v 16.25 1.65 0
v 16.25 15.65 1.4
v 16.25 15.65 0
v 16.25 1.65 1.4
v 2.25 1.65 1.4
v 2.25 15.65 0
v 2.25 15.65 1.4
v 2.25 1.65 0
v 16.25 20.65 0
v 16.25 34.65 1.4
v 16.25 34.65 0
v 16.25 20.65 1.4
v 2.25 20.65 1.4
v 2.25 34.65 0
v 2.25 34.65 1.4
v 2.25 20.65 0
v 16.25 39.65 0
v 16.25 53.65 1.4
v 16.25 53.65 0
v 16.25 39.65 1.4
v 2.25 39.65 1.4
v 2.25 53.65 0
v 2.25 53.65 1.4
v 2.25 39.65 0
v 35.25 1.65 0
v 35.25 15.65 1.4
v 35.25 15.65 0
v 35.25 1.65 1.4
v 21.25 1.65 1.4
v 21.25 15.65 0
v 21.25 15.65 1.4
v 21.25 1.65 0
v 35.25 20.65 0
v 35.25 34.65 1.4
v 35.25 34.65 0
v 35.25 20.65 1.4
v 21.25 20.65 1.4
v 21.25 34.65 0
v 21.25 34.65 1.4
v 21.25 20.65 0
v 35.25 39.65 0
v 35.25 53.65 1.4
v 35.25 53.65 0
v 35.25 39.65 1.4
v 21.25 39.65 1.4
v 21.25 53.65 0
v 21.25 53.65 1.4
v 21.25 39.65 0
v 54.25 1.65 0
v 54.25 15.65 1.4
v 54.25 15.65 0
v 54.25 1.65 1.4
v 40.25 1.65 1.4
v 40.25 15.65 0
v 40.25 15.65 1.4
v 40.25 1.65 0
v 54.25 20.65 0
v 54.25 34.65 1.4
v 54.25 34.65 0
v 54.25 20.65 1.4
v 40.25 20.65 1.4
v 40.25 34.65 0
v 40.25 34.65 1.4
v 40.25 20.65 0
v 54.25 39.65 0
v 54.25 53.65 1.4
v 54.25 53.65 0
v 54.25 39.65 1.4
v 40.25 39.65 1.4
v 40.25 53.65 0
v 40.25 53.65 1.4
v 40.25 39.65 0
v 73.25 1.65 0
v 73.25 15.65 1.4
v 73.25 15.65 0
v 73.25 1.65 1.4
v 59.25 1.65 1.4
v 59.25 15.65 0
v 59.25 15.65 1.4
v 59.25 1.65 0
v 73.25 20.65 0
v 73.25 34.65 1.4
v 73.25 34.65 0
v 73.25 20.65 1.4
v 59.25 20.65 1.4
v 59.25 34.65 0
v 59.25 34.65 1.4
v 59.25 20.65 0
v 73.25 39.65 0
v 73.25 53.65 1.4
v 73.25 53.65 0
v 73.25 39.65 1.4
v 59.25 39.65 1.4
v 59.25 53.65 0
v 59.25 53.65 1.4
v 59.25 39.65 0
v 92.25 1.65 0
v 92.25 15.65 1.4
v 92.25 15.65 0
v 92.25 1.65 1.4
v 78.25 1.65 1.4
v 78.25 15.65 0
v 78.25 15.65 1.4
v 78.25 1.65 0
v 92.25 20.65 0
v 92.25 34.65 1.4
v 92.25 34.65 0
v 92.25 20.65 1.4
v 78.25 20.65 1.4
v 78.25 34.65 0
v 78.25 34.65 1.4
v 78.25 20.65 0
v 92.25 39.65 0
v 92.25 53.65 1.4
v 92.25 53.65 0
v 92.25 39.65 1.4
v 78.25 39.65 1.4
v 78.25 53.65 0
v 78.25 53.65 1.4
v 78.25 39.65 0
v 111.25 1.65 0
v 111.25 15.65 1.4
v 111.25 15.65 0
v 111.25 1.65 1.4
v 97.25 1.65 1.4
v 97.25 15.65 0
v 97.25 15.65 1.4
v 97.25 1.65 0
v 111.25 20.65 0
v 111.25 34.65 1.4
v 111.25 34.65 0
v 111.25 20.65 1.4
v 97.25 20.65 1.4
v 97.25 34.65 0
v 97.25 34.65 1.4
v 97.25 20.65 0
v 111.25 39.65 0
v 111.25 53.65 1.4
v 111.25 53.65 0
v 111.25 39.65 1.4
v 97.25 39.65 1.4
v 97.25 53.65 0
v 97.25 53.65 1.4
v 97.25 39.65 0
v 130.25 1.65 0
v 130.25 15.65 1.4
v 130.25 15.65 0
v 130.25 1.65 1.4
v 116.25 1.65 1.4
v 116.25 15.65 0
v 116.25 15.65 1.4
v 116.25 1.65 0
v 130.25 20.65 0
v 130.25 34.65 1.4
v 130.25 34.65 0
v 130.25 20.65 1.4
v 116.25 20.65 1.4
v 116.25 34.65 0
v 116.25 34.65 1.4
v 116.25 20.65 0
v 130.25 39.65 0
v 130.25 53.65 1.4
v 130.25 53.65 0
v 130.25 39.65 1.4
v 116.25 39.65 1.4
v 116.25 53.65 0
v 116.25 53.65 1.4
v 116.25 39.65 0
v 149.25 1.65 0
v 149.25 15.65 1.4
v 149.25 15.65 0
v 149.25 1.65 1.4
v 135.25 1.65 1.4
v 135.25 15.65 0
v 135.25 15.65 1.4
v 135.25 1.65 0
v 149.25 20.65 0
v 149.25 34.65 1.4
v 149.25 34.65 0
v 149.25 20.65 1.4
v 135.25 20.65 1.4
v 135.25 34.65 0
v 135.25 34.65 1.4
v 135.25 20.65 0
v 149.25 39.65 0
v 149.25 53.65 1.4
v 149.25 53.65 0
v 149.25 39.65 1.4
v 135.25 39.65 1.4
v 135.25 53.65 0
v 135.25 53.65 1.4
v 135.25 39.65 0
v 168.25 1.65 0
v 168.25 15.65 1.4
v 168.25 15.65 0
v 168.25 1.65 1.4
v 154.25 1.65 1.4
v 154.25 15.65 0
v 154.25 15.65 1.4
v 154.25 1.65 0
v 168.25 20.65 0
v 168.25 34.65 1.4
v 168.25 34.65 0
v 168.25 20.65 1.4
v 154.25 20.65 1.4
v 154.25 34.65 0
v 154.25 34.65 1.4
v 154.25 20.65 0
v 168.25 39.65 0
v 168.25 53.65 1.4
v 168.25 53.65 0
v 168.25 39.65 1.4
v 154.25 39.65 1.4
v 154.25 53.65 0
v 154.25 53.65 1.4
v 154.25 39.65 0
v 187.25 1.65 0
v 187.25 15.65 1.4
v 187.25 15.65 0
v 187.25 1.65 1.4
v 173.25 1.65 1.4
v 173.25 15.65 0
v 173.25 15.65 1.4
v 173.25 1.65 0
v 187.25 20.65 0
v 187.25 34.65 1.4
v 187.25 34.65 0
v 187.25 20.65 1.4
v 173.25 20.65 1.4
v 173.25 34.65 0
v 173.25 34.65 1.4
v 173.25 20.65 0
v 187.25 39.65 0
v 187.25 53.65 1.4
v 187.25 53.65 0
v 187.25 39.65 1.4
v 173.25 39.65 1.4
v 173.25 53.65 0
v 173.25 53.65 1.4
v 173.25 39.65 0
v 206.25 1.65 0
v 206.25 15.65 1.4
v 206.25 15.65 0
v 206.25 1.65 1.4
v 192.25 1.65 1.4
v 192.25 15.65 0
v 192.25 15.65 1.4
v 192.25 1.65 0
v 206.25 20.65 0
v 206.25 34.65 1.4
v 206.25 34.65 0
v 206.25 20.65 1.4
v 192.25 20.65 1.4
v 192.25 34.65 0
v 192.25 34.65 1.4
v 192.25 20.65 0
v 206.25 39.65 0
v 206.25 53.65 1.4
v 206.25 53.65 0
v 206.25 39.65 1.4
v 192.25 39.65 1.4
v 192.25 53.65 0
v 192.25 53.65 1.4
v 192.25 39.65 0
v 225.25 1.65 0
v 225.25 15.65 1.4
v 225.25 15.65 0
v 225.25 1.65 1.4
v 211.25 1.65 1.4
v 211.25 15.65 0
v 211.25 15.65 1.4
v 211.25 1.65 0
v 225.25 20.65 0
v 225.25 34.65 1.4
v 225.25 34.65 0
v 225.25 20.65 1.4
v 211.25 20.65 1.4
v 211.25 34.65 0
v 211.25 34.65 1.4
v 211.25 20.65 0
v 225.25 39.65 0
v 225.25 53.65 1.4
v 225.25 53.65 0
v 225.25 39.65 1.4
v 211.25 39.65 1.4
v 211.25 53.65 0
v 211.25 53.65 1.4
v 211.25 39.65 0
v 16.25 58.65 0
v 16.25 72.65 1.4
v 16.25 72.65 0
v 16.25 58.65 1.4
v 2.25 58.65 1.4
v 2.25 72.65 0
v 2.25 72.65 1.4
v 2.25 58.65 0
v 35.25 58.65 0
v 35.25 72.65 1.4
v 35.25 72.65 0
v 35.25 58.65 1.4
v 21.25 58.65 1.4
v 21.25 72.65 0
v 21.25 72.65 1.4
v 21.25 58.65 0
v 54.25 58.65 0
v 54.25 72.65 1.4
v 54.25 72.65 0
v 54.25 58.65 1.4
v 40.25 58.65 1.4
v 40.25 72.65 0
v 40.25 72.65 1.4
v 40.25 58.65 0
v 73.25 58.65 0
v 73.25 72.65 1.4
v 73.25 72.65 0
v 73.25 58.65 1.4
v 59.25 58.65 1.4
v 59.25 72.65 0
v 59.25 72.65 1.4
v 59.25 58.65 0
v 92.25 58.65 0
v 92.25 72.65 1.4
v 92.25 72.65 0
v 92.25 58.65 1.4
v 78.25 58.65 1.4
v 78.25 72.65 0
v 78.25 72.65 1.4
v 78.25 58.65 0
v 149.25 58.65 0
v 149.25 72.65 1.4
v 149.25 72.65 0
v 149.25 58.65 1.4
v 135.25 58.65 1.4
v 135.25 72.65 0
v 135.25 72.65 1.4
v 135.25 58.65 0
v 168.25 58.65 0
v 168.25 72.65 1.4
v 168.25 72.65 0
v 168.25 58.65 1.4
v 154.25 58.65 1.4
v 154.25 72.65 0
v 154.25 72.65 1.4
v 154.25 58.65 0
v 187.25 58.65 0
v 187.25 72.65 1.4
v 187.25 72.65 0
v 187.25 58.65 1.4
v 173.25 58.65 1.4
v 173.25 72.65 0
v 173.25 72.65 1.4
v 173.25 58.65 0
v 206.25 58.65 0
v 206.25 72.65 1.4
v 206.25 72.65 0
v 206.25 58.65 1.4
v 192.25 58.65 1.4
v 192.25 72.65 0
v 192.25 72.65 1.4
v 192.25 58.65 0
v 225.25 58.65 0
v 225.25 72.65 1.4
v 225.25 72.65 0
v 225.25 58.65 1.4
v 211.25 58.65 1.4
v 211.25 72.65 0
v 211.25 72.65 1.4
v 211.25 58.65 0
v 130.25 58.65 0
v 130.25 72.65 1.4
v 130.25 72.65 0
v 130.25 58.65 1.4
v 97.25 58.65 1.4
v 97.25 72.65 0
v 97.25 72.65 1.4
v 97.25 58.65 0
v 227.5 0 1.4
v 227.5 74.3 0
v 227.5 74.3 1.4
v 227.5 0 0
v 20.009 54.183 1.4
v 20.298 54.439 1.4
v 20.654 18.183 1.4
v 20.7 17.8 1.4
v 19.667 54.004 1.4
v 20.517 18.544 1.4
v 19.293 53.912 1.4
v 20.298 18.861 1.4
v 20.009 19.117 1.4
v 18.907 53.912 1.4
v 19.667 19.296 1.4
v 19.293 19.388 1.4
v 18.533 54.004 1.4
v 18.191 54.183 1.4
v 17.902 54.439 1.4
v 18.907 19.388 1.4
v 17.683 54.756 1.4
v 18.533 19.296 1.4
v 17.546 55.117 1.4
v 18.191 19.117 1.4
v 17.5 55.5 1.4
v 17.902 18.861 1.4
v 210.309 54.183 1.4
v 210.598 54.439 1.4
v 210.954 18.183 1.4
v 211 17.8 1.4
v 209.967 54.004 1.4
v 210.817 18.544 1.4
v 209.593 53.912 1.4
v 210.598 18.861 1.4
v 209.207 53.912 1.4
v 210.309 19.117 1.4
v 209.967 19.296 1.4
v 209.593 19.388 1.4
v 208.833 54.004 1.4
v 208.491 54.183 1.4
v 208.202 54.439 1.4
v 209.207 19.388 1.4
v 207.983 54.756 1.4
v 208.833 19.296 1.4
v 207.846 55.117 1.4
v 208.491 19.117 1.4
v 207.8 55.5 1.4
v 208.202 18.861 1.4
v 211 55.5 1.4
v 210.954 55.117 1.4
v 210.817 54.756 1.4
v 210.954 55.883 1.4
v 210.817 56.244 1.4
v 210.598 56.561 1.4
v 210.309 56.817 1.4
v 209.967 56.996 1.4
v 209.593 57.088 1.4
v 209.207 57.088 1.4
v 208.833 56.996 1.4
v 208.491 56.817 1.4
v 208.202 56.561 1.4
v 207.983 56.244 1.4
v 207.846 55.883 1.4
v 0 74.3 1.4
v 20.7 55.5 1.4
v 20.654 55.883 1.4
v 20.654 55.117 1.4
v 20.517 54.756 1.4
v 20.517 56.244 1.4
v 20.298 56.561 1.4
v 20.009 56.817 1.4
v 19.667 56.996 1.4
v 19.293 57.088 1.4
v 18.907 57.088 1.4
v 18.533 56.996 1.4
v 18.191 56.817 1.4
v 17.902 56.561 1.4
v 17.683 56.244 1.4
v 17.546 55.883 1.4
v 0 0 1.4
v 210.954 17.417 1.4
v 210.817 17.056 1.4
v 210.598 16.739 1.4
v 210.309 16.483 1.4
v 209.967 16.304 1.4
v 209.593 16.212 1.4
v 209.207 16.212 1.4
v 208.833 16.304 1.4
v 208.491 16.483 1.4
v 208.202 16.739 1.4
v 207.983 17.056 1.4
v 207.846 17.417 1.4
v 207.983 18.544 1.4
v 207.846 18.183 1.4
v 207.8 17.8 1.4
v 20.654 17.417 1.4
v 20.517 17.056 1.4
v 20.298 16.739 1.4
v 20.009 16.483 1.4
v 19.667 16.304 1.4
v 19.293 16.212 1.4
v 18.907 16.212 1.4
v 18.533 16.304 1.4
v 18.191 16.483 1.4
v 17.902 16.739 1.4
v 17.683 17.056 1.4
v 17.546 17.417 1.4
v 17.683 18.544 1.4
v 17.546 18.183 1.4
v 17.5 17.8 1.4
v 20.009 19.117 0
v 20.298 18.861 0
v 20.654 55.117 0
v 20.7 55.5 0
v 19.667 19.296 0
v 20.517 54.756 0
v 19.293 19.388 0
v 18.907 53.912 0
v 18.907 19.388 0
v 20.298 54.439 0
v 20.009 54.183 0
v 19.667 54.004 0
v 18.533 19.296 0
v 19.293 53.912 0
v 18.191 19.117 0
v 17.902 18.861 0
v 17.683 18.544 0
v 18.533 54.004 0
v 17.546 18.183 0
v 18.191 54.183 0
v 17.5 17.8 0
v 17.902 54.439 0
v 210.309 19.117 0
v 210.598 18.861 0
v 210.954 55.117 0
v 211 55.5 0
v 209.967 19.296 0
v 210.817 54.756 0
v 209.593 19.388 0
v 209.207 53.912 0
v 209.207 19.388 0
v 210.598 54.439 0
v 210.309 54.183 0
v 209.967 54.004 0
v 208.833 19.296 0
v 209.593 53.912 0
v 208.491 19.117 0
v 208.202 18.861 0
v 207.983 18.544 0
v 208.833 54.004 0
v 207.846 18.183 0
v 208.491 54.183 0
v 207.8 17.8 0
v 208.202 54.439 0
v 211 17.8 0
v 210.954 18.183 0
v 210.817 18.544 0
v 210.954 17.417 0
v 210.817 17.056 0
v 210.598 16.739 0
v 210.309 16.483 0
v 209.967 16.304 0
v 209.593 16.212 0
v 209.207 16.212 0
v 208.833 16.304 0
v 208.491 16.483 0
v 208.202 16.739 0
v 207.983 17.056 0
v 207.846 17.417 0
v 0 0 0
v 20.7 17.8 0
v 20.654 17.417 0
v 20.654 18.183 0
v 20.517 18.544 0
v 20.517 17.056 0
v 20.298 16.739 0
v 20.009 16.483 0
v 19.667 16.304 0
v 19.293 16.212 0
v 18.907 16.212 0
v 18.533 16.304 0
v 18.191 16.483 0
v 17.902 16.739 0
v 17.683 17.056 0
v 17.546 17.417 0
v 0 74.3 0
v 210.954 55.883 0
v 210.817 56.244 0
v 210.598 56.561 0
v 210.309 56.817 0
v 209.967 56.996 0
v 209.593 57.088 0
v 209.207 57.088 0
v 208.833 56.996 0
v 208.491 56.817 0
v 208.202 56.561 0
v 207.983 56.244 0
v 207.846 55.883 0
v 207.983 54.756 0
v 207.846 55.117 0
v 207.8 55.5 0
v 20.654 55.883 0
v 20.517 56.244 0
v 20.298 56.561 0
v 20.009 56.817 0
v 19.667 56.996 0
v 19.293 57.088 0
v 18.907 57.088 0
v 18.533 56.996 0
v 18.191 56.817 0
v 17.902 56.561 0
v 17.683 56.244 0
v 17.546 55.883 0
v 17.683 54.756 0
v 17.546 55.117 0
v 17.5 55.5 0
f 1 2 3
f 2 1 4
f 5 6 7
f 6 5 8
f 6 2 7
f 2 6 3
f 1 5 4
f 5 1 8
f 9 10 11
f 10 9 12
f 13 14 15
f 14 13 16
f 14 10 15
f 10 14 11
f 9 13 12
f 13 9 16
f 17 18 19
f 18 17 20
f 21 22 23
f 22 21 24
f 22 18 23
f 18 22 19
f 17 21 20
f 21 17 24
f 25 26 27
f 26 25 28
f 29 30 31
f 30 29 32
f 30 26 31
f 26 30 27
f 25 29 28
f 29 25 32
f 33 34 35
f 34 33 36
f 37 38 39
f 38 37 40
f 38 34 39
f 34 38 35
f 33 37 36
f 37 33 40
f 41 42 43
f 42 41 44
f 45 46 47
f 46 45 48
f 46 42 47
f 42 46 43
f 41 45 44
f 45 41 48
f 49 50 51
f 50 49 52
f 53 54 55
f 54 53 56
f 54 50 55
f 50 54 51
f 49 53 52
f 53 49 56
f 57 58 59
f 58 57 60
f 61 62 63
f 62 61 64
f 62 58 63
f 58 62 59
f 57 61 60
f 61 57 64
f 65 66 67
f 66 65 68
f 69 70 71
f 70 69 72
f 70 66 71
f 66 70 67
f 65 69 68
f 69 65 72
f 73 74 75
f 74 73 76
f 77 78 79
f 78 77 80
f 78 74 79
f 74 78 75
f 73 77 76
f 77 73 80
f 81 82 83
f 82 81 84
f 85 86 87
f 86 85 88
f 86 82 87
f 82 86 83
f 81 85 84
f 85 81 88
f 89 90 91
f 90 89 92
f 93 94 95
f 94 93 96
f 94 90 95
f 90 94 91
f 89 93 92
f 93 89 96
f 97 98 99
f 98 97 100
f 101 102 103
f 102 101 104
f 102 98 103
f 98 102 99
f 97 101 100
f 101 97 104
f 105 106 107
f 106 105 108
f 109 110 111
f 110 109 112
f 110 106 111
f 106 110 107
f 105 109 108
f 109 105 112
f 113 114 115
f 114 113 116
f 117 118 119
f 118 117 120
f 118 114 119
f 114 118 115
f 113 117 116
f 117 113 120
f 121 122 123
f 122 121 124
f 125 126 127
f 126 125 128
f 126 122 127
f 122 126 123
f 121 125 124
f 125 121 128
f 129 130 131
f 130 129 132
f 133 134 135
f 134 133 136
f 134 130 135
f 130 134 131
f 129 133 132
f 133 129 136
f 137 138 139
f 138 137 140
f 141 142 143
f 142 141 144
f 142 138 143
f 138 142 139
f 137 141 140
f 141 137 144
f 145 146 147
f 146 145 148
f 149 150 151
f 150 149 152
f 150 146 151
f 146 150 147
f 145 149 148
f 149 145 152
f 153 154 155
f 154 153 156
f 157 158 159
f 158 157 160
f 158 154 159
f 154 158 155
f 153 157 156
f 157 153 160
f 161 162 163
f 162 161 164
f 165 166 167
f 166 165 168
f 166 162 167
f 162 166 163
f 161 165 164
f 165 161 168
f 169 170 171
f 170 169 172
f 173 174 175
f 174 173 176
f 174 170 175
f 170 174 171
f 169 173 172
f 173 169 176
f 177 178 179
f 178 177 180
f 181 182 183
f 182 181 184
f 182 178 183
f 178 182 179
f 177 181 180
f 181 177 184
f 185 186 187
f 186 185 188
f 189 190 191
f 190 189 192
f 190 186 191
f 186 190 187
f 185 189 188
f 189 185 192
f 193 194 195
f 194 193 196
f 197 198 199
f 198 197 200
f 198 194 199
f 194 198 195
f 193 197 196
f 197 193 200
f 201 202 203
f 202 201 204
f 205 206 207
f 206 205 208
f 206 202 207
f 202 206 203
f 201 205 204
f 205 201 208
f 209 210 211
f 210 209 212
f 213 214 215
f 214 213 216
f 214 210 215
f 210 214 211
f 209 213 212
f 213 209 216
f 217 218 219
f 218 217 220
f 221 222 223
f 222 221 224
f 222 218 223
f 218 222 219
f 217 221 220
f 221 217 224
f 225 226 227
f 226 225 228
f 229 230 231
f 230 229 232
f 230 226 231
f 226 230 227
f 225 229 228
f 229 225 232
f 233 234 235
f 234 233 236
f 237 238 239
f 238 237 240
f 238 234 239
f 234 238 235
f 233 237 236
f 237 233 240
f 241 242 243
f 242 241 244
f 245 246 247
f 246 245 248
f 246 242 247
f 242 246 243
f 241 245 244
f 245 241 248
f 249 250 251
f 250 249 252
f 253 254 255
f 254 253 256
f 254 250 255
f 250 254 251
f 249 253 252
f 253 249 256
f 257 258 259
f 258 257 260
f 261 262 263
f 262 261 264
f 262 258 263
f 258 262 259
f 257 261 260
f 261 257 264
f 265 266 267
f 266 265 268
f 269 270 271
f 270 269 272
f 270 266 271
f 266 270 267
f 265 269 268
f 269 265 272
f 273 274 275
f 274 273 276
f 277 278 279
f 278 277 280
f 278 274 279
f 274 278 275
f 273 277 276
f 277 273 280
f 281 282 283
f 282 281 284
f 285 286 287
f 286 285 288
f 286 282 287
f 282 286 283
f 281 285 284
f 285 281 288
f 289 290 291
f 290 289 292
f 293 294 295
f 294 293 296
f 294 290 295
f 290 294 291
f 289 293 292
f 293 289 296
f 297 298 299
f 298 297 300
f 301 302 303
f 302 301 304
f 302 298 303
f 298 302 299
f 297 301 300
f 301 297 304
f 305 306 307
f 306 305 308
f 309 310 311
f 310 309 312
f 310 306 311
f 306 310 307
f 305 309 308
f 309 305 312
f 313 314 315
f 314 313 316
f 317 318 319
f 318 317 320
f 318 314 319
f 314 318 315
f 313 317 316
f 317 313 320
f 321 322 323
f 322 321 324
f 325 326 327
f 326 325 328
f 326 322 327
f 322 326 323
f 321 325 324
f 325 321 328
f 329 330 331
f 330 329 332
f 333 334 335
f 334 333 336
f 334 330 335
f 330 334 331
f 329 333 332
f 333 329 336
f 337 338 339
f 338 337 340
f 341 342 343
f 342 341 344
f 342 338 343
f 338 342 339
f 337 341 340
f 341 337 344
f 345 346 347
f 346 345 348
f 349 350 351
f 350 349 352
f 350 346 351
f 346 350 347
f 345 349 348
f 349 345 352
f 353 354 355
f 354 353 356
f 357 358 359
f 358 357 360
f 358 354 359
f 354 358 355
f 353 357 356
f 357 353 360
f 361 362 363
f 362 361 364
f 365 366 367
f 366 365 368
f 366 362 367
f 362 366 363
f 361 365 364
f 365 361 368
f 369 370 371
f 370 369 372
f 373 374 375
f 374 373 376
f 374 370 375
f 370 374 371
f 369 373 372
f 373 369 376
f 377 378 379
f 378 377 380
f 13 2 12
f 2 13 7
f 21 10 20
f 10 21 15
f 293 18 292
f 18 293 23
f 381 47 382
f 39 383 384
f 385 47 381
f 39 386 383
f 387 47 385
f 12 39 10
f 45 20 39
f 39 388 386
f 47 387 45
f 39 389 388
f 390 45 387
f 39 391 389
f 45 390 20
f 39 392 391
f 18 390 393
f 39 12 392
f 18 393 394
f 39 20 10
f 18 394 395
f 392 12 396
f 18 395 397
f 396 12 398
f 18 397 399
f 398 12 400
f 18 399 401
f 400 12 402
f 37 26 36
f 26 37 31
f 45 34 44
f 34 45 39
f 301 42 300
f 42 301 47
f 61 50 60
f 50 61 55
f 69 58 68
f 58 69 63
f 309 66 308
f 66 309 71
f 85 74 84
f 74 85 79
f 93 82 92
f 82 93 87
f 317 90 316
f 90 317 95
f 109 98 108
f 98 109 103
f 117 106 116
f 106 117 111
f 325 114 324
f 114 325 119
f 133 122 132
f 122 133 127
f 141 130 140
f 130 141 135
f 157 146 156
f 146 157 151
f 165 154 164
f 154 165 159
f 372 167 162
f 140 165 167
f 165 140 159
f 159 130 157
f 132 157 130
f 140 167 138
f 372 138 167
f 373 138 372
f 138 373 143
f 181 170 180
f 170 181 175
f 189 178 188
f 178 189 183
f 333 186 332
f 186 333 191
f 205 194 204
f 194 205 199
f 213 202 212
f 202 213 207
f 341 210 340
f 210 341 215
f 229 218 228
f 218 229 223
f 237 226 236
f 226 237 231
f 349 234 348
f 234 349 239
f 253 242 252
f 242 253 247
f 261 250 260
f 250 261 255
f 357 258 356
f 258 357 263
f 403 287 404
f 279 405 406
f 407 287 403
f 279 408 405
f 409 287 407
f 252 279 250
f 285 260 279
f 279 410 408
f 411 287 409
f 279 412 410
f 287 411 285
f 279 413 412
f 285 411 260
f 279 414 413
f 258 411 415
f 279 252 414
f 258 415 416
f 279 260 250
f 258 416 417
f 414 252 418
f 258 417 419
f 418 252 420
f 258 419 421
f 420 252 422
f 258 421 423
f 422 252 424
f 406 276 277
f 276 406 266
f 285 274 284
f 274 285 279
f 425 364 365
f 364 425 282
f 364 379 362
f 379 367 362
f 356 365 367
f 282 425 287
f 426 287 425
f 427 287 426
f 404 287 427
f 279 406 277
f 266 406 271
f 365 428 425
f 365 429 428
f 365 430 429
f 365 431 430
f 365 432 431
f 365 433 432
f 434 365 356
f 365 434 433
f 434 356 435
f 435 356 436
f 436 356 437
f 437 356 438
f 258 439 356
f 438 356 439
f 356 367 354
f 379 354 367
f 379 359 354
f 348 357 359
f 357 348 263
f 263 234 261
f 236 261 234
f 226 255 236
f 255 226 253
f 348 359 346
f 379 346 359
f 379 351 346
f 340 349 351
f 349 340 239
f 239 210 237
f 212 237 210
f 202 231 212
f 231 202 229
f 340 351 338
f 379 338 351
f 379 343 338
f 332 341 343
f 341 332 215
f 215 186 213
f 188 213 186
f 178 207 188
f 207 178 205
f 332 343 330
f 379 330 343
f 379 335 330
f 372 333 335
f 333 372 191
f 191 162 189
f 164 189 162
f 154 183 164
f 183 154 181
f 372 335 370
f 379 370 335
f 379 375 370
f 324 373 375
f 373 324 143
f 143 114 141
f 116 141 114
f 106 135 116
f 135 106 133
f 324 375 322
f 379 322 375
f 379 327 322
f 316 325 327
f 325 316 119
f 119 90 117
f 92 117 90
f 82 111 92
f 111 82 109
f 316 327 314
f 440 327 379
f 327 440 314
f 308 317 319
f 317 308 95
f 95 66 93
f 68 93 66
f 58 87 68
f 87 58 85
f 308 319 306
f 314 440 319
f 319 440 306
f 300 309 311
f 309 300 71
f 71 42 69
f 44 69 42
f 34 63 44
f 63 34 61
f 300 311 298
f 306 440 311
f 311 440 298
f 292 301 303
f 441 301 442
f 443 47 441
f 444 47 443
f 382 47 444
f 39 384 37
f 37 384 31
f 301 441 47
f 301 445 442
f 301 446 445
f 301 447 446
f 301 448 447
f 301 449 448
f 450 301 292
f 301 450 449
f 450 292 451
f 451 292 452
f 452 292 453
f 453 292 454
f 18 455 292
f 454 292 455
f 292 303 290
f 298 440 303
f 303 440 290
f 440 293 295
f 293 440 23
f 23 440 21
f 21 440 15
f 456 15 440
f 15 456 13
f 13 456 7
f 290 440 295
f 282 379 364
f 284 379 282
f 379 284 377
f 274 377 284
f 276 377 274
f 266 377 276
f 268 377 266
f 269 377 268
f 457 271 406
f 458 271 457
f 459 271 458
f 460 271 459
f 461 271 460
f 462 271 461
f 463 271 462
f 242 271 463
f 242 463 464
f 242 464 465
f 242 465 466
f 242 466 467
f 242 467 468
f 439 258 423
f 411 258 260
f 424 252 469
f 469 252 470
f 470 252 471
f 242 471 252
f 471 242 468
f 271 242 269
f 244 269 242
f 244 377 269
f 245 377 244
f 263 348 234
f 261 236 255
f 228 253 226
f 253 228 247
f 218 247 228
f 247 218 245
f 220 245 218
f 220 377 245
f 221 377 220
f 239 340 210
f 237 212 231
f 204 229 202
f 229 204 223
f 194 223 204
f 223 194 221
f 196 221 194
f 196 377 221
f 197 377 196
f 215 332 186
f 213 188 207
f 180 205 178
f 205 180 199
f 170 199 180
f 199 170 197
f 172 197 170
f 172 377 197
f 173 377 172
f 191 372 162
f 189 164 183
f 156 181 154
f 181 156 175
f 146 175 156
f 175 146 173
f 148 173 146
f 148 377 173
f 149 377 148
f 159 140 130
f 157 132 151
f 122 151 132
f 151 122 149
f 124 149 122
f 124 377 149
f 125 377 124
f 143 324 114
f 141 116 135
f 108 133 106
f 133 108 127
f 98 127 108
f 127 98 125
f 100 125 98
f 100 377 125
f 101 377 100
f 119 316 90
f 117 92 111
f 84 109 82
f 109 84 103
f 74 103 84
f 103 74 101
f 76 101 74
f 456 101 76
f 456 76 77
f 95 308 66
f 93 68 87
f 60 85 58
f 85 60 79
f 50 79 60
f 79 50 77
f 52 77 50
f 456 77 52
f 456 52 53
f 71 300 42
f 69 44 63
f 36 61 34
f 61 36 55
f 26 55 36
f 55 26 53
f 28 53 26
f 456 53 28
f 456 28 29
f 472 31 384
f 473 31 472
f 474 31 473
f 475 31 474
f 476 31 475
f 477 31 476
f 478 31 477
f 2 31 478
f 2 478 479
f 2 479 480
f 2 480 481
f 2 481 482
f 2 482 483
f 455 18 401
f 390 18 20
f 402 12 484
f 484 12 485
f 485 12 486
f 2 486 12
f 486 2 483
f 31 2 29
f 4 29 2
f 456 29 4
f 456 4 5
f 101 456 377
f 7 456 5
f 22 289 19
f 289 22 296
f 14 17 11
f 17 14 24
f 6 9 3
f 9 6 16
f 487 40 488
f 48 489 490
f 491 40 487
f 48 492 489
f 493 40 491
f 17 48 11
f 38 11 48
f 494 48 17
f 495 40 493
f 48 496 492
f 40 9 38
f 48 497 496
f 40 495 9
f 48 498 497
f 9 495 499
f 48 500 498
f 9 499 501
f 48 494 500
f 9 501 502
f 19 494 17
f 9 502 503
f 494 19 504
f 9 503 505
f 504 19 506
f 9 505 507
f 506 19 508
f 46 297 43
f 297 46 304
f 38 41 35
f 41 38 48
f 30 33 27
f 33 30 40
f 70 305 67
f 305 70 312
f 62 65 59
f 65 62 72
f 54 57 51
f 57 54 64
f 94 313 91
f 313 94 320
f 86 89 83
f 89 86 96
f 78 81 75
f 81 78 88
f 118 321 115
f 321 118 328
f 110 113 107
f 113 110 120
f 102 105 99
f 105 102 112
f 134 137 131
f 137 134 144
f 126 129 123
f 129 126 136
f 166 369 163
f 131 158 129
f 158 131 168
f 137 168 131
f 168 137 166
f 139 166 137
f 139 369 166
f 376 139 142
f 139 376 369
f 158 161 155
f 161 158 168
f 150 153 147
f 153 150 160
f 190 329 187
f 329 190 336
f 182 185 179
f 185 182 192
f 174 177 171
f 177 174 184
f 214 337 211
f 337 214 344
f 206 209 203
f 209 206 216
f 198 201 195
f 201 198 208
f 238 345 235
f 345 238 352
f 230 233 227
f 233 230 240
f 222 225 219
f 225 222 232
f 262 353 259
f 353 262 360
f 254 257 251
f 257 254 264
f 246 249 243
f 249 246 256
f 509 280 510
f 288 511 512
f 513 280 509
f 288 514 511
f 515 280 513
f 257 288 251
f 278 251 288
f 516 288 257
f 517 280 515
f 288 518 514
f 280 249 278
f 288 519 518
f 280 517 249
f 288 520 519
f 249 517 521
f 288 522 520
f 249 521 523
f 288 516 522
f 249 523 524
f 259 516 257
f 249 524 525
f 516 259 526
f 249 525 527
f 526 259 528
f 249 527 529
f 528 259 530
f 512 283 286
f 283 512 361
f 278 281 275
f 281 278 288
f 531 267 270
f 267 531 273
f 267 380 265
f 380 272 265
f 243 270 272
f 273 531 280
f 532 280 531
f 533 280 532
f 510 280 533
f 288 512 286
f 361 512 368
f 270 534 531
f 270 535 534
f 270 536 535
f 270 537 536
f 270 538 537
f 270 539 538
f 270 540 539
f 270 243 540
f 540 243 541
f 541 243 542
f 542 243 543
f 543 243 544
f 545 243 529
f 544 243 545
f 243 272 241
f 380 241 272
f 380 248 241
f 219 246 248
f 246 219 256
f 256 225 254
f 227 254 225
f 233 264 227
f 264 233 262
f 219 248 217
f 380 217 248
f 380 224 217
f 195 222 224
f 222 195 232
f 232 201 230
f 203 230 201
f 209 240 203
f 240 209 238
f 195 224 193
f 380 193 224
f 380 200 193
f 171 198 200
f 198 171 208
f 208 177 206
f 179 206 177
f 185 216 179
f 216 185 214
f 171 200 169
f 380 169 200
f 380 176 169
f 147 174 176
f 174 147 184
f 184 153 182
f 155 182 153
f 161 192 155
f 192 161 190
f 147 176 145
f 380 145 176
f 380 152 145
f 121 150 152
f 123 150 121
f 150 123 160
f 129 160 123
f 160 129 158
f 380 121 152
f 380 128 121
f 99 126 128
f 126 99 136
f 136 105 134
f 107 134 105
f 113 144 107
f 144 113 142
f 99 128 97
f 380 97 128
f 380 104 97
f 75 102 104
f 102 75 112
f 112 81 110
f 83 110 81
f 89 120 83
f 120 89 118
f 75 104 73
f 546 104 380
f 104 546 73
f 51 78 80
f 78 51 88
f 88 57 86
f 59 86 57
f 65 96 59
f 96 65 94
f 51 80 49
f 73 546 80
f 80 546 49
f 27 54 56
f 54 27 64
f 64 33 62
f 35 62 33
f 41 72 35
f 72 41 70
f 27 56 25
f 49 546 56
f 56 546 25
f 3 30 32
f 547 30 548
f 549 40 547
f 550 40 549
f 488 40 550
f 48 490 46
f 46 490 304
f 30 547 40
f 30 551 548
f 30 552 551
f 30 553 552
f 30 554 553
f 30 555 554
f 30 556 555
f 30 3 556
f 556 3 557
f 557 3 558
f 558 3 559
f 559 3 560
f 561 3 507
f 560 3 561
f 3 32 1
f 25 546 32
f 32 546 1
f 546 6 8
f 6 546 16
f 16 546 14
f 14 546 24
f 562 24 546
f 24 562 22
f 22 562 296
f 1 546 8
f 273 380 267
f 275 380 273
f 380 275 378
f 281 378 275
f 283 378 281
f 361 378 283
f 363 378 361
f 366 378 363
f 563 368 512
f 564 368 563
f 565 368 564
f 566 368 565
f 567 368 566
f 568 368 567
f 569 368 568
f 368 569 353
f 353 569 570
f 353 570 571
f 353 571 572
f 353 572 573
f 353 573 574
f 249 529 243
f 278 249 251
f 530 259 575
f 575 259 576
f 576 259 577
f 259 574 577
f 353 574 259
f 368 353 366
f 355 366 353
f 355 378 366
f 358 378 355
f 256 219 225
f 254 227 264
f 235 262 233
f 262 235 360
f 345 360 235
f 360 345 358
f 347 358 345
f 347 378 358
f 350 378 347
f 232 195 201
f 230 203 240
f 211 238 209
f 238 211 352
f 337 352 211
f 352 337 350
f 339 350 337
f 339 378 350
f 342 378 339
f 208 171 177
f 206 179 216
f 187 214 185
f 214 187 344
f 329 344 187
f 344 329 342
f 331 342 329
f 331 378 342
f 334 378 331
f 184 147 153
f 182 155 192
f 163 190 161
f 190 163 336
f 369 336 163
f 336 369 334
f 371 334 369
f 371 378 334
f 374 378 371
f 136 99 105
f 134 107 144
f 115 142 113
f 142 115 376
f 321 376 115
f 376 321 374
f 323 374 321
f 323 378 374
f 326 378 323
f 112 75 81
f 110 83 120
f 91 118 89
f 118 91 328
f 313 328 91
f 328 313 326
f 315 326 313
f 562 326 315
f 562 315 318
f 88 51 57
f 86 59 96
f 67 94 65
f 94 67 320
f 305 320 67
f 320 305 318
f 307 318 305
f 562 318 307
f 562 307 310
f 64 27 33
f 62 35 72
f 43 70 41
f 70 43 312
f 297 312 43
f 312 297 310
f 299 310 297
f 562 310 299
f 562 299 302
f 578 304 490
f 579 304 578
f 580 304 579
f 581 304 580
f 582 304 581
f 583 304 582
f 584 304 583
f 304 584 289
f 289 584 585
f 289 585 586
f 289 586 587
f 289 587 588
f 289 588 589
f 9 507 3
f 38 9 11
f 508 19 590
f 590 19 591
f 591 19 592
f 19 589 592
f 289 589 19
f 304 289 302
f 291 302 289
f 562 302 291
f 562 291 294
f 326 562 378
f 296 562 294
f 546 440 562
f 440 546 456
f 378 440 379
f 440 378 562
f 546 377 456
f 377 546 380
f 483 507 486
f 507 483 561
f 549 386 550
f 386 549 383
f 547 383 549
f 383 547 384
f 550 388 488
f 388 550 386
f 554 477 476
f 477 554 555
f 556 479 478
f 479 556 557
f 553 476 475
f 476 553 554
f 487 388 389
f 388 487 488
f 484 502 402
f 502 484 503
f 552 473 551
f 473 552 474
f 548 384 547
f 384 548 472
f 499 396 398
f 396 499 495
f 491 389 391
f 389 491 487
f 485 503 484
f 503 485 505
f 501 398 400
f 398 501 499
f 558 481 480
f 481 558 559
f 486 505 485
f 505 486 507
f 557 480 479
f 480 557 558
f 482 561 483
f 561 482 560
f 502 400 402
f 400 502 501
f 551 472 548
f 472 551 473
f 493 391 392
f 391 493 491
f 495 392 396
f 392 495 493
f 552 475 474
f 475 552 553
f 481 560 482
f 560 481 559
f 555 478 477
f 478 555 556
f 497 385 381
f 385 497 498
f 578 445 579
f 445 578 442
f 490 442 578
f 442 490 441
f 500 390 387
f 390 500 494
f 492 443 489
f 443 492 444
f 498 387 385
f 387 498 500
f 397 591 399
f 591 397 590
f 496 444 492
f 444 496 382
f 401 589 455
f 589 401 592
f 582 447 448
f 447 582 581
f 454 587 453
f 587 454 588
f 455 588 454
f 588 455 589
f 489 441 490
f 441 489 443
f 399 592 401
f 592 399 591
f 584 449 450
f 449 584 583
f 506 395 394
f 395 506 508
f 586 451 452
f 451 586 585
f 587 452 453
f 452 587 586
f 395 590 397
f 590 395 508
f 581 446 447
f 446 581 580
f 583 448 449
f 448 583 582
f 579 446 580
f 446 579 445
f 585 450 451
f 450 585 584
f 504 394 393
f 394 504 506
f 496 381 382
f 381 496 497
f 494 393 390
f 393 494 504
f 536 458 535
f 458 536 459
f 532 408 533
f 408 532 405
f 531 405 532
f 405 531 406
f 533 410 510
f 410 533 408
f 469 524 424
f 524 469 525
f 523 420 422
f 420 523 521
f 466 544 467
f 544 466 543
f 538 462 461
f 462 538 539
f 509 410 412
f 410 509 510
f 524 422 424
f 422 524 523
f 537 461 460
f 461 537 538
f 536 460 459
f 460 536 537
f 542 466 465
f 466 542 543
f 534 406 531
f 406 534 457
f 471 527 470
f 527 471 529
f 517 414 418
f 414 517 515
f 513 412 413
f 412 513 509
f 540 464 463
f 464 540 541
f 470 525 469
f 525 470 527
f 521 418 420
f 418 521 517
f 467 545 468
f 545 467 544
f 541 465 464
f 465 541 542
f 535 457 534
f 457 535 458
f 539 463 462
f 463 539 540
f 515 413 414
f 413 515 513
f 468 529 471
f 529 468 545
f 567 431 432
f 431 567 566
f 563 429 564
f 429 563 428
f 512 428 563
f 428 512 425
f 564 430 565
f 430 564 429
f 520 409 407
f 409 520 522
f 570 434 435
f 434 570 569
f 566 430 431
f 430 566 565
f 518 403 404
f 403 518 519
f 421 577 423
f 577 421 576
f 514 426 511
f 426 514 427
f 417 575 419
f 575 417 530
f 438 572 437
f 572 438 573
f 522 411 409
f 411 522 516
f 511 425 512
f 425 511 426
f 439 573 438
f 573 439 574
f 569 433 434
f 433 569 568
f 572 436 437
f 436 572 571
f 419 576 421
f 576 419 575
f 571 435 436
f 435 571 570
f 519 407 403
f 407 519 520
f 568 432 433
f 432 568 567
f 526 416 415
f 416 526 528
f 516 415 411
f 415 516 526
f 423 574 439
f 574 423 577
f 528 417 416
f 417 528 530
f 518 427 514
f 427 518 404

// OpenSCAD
$fa = 1;
$fs = 0.4;

button_spacing = 19;
padding=1;
pcb_edge=padding / 2;
pcb=[226.5,73.3,10.5];
inside=[pcb[0]+padding, pcb[1]+padding, 1.4];


module button() {
	cube([14, 14, 4]);
}

module spacebar() {
	cube([33, 14, 4]);
}

module buttons(rows, cols) {
	for (i=[0:1:cols - 1]) {
		for (j=[0:1:rows - 1]) {
			translate([i*button_spacing,j*button_spacing, -2]) button();
		}
	}
}

module grid() {
	buttons(3, 12);
	translate([0, button_spacing*3, 0]) buttons(1, 5);
	translate([button_spacing * 7, button_spacing*3, 0]) buttons(1, 5);
	translate([button_spacing * 5, button_spacing*3, -2]) spacebar();
	translate([button_spacing * 7, button_spacing*3, 0]) buttons(1, 5);
}

module screw_mount(x, y , z) {
	translate([x, y, z]) cylinder(4, 1.6, 1.6);
}

difference() {
	cube(inside);
	translate([2.25, 1.65, 0]) grid();
//	translate([-10, -10, -4]) cube(143, 100, 10);
	screw_mount(pcb_edge + 18.6, pcb_edge + 17.3, -1);
	screw_mount(pcb_edge + 18.6, inside[1] - pcb_edge - 18.3, -1);
	screw_mount(inside[0] - pcb_edge - 17.6, pcb_edge + 17.3, -1);
	screw_mount(inside[0] - pcb_edge - 17.6, inside[1] - pcb_edge - 18.3, -1);
}
